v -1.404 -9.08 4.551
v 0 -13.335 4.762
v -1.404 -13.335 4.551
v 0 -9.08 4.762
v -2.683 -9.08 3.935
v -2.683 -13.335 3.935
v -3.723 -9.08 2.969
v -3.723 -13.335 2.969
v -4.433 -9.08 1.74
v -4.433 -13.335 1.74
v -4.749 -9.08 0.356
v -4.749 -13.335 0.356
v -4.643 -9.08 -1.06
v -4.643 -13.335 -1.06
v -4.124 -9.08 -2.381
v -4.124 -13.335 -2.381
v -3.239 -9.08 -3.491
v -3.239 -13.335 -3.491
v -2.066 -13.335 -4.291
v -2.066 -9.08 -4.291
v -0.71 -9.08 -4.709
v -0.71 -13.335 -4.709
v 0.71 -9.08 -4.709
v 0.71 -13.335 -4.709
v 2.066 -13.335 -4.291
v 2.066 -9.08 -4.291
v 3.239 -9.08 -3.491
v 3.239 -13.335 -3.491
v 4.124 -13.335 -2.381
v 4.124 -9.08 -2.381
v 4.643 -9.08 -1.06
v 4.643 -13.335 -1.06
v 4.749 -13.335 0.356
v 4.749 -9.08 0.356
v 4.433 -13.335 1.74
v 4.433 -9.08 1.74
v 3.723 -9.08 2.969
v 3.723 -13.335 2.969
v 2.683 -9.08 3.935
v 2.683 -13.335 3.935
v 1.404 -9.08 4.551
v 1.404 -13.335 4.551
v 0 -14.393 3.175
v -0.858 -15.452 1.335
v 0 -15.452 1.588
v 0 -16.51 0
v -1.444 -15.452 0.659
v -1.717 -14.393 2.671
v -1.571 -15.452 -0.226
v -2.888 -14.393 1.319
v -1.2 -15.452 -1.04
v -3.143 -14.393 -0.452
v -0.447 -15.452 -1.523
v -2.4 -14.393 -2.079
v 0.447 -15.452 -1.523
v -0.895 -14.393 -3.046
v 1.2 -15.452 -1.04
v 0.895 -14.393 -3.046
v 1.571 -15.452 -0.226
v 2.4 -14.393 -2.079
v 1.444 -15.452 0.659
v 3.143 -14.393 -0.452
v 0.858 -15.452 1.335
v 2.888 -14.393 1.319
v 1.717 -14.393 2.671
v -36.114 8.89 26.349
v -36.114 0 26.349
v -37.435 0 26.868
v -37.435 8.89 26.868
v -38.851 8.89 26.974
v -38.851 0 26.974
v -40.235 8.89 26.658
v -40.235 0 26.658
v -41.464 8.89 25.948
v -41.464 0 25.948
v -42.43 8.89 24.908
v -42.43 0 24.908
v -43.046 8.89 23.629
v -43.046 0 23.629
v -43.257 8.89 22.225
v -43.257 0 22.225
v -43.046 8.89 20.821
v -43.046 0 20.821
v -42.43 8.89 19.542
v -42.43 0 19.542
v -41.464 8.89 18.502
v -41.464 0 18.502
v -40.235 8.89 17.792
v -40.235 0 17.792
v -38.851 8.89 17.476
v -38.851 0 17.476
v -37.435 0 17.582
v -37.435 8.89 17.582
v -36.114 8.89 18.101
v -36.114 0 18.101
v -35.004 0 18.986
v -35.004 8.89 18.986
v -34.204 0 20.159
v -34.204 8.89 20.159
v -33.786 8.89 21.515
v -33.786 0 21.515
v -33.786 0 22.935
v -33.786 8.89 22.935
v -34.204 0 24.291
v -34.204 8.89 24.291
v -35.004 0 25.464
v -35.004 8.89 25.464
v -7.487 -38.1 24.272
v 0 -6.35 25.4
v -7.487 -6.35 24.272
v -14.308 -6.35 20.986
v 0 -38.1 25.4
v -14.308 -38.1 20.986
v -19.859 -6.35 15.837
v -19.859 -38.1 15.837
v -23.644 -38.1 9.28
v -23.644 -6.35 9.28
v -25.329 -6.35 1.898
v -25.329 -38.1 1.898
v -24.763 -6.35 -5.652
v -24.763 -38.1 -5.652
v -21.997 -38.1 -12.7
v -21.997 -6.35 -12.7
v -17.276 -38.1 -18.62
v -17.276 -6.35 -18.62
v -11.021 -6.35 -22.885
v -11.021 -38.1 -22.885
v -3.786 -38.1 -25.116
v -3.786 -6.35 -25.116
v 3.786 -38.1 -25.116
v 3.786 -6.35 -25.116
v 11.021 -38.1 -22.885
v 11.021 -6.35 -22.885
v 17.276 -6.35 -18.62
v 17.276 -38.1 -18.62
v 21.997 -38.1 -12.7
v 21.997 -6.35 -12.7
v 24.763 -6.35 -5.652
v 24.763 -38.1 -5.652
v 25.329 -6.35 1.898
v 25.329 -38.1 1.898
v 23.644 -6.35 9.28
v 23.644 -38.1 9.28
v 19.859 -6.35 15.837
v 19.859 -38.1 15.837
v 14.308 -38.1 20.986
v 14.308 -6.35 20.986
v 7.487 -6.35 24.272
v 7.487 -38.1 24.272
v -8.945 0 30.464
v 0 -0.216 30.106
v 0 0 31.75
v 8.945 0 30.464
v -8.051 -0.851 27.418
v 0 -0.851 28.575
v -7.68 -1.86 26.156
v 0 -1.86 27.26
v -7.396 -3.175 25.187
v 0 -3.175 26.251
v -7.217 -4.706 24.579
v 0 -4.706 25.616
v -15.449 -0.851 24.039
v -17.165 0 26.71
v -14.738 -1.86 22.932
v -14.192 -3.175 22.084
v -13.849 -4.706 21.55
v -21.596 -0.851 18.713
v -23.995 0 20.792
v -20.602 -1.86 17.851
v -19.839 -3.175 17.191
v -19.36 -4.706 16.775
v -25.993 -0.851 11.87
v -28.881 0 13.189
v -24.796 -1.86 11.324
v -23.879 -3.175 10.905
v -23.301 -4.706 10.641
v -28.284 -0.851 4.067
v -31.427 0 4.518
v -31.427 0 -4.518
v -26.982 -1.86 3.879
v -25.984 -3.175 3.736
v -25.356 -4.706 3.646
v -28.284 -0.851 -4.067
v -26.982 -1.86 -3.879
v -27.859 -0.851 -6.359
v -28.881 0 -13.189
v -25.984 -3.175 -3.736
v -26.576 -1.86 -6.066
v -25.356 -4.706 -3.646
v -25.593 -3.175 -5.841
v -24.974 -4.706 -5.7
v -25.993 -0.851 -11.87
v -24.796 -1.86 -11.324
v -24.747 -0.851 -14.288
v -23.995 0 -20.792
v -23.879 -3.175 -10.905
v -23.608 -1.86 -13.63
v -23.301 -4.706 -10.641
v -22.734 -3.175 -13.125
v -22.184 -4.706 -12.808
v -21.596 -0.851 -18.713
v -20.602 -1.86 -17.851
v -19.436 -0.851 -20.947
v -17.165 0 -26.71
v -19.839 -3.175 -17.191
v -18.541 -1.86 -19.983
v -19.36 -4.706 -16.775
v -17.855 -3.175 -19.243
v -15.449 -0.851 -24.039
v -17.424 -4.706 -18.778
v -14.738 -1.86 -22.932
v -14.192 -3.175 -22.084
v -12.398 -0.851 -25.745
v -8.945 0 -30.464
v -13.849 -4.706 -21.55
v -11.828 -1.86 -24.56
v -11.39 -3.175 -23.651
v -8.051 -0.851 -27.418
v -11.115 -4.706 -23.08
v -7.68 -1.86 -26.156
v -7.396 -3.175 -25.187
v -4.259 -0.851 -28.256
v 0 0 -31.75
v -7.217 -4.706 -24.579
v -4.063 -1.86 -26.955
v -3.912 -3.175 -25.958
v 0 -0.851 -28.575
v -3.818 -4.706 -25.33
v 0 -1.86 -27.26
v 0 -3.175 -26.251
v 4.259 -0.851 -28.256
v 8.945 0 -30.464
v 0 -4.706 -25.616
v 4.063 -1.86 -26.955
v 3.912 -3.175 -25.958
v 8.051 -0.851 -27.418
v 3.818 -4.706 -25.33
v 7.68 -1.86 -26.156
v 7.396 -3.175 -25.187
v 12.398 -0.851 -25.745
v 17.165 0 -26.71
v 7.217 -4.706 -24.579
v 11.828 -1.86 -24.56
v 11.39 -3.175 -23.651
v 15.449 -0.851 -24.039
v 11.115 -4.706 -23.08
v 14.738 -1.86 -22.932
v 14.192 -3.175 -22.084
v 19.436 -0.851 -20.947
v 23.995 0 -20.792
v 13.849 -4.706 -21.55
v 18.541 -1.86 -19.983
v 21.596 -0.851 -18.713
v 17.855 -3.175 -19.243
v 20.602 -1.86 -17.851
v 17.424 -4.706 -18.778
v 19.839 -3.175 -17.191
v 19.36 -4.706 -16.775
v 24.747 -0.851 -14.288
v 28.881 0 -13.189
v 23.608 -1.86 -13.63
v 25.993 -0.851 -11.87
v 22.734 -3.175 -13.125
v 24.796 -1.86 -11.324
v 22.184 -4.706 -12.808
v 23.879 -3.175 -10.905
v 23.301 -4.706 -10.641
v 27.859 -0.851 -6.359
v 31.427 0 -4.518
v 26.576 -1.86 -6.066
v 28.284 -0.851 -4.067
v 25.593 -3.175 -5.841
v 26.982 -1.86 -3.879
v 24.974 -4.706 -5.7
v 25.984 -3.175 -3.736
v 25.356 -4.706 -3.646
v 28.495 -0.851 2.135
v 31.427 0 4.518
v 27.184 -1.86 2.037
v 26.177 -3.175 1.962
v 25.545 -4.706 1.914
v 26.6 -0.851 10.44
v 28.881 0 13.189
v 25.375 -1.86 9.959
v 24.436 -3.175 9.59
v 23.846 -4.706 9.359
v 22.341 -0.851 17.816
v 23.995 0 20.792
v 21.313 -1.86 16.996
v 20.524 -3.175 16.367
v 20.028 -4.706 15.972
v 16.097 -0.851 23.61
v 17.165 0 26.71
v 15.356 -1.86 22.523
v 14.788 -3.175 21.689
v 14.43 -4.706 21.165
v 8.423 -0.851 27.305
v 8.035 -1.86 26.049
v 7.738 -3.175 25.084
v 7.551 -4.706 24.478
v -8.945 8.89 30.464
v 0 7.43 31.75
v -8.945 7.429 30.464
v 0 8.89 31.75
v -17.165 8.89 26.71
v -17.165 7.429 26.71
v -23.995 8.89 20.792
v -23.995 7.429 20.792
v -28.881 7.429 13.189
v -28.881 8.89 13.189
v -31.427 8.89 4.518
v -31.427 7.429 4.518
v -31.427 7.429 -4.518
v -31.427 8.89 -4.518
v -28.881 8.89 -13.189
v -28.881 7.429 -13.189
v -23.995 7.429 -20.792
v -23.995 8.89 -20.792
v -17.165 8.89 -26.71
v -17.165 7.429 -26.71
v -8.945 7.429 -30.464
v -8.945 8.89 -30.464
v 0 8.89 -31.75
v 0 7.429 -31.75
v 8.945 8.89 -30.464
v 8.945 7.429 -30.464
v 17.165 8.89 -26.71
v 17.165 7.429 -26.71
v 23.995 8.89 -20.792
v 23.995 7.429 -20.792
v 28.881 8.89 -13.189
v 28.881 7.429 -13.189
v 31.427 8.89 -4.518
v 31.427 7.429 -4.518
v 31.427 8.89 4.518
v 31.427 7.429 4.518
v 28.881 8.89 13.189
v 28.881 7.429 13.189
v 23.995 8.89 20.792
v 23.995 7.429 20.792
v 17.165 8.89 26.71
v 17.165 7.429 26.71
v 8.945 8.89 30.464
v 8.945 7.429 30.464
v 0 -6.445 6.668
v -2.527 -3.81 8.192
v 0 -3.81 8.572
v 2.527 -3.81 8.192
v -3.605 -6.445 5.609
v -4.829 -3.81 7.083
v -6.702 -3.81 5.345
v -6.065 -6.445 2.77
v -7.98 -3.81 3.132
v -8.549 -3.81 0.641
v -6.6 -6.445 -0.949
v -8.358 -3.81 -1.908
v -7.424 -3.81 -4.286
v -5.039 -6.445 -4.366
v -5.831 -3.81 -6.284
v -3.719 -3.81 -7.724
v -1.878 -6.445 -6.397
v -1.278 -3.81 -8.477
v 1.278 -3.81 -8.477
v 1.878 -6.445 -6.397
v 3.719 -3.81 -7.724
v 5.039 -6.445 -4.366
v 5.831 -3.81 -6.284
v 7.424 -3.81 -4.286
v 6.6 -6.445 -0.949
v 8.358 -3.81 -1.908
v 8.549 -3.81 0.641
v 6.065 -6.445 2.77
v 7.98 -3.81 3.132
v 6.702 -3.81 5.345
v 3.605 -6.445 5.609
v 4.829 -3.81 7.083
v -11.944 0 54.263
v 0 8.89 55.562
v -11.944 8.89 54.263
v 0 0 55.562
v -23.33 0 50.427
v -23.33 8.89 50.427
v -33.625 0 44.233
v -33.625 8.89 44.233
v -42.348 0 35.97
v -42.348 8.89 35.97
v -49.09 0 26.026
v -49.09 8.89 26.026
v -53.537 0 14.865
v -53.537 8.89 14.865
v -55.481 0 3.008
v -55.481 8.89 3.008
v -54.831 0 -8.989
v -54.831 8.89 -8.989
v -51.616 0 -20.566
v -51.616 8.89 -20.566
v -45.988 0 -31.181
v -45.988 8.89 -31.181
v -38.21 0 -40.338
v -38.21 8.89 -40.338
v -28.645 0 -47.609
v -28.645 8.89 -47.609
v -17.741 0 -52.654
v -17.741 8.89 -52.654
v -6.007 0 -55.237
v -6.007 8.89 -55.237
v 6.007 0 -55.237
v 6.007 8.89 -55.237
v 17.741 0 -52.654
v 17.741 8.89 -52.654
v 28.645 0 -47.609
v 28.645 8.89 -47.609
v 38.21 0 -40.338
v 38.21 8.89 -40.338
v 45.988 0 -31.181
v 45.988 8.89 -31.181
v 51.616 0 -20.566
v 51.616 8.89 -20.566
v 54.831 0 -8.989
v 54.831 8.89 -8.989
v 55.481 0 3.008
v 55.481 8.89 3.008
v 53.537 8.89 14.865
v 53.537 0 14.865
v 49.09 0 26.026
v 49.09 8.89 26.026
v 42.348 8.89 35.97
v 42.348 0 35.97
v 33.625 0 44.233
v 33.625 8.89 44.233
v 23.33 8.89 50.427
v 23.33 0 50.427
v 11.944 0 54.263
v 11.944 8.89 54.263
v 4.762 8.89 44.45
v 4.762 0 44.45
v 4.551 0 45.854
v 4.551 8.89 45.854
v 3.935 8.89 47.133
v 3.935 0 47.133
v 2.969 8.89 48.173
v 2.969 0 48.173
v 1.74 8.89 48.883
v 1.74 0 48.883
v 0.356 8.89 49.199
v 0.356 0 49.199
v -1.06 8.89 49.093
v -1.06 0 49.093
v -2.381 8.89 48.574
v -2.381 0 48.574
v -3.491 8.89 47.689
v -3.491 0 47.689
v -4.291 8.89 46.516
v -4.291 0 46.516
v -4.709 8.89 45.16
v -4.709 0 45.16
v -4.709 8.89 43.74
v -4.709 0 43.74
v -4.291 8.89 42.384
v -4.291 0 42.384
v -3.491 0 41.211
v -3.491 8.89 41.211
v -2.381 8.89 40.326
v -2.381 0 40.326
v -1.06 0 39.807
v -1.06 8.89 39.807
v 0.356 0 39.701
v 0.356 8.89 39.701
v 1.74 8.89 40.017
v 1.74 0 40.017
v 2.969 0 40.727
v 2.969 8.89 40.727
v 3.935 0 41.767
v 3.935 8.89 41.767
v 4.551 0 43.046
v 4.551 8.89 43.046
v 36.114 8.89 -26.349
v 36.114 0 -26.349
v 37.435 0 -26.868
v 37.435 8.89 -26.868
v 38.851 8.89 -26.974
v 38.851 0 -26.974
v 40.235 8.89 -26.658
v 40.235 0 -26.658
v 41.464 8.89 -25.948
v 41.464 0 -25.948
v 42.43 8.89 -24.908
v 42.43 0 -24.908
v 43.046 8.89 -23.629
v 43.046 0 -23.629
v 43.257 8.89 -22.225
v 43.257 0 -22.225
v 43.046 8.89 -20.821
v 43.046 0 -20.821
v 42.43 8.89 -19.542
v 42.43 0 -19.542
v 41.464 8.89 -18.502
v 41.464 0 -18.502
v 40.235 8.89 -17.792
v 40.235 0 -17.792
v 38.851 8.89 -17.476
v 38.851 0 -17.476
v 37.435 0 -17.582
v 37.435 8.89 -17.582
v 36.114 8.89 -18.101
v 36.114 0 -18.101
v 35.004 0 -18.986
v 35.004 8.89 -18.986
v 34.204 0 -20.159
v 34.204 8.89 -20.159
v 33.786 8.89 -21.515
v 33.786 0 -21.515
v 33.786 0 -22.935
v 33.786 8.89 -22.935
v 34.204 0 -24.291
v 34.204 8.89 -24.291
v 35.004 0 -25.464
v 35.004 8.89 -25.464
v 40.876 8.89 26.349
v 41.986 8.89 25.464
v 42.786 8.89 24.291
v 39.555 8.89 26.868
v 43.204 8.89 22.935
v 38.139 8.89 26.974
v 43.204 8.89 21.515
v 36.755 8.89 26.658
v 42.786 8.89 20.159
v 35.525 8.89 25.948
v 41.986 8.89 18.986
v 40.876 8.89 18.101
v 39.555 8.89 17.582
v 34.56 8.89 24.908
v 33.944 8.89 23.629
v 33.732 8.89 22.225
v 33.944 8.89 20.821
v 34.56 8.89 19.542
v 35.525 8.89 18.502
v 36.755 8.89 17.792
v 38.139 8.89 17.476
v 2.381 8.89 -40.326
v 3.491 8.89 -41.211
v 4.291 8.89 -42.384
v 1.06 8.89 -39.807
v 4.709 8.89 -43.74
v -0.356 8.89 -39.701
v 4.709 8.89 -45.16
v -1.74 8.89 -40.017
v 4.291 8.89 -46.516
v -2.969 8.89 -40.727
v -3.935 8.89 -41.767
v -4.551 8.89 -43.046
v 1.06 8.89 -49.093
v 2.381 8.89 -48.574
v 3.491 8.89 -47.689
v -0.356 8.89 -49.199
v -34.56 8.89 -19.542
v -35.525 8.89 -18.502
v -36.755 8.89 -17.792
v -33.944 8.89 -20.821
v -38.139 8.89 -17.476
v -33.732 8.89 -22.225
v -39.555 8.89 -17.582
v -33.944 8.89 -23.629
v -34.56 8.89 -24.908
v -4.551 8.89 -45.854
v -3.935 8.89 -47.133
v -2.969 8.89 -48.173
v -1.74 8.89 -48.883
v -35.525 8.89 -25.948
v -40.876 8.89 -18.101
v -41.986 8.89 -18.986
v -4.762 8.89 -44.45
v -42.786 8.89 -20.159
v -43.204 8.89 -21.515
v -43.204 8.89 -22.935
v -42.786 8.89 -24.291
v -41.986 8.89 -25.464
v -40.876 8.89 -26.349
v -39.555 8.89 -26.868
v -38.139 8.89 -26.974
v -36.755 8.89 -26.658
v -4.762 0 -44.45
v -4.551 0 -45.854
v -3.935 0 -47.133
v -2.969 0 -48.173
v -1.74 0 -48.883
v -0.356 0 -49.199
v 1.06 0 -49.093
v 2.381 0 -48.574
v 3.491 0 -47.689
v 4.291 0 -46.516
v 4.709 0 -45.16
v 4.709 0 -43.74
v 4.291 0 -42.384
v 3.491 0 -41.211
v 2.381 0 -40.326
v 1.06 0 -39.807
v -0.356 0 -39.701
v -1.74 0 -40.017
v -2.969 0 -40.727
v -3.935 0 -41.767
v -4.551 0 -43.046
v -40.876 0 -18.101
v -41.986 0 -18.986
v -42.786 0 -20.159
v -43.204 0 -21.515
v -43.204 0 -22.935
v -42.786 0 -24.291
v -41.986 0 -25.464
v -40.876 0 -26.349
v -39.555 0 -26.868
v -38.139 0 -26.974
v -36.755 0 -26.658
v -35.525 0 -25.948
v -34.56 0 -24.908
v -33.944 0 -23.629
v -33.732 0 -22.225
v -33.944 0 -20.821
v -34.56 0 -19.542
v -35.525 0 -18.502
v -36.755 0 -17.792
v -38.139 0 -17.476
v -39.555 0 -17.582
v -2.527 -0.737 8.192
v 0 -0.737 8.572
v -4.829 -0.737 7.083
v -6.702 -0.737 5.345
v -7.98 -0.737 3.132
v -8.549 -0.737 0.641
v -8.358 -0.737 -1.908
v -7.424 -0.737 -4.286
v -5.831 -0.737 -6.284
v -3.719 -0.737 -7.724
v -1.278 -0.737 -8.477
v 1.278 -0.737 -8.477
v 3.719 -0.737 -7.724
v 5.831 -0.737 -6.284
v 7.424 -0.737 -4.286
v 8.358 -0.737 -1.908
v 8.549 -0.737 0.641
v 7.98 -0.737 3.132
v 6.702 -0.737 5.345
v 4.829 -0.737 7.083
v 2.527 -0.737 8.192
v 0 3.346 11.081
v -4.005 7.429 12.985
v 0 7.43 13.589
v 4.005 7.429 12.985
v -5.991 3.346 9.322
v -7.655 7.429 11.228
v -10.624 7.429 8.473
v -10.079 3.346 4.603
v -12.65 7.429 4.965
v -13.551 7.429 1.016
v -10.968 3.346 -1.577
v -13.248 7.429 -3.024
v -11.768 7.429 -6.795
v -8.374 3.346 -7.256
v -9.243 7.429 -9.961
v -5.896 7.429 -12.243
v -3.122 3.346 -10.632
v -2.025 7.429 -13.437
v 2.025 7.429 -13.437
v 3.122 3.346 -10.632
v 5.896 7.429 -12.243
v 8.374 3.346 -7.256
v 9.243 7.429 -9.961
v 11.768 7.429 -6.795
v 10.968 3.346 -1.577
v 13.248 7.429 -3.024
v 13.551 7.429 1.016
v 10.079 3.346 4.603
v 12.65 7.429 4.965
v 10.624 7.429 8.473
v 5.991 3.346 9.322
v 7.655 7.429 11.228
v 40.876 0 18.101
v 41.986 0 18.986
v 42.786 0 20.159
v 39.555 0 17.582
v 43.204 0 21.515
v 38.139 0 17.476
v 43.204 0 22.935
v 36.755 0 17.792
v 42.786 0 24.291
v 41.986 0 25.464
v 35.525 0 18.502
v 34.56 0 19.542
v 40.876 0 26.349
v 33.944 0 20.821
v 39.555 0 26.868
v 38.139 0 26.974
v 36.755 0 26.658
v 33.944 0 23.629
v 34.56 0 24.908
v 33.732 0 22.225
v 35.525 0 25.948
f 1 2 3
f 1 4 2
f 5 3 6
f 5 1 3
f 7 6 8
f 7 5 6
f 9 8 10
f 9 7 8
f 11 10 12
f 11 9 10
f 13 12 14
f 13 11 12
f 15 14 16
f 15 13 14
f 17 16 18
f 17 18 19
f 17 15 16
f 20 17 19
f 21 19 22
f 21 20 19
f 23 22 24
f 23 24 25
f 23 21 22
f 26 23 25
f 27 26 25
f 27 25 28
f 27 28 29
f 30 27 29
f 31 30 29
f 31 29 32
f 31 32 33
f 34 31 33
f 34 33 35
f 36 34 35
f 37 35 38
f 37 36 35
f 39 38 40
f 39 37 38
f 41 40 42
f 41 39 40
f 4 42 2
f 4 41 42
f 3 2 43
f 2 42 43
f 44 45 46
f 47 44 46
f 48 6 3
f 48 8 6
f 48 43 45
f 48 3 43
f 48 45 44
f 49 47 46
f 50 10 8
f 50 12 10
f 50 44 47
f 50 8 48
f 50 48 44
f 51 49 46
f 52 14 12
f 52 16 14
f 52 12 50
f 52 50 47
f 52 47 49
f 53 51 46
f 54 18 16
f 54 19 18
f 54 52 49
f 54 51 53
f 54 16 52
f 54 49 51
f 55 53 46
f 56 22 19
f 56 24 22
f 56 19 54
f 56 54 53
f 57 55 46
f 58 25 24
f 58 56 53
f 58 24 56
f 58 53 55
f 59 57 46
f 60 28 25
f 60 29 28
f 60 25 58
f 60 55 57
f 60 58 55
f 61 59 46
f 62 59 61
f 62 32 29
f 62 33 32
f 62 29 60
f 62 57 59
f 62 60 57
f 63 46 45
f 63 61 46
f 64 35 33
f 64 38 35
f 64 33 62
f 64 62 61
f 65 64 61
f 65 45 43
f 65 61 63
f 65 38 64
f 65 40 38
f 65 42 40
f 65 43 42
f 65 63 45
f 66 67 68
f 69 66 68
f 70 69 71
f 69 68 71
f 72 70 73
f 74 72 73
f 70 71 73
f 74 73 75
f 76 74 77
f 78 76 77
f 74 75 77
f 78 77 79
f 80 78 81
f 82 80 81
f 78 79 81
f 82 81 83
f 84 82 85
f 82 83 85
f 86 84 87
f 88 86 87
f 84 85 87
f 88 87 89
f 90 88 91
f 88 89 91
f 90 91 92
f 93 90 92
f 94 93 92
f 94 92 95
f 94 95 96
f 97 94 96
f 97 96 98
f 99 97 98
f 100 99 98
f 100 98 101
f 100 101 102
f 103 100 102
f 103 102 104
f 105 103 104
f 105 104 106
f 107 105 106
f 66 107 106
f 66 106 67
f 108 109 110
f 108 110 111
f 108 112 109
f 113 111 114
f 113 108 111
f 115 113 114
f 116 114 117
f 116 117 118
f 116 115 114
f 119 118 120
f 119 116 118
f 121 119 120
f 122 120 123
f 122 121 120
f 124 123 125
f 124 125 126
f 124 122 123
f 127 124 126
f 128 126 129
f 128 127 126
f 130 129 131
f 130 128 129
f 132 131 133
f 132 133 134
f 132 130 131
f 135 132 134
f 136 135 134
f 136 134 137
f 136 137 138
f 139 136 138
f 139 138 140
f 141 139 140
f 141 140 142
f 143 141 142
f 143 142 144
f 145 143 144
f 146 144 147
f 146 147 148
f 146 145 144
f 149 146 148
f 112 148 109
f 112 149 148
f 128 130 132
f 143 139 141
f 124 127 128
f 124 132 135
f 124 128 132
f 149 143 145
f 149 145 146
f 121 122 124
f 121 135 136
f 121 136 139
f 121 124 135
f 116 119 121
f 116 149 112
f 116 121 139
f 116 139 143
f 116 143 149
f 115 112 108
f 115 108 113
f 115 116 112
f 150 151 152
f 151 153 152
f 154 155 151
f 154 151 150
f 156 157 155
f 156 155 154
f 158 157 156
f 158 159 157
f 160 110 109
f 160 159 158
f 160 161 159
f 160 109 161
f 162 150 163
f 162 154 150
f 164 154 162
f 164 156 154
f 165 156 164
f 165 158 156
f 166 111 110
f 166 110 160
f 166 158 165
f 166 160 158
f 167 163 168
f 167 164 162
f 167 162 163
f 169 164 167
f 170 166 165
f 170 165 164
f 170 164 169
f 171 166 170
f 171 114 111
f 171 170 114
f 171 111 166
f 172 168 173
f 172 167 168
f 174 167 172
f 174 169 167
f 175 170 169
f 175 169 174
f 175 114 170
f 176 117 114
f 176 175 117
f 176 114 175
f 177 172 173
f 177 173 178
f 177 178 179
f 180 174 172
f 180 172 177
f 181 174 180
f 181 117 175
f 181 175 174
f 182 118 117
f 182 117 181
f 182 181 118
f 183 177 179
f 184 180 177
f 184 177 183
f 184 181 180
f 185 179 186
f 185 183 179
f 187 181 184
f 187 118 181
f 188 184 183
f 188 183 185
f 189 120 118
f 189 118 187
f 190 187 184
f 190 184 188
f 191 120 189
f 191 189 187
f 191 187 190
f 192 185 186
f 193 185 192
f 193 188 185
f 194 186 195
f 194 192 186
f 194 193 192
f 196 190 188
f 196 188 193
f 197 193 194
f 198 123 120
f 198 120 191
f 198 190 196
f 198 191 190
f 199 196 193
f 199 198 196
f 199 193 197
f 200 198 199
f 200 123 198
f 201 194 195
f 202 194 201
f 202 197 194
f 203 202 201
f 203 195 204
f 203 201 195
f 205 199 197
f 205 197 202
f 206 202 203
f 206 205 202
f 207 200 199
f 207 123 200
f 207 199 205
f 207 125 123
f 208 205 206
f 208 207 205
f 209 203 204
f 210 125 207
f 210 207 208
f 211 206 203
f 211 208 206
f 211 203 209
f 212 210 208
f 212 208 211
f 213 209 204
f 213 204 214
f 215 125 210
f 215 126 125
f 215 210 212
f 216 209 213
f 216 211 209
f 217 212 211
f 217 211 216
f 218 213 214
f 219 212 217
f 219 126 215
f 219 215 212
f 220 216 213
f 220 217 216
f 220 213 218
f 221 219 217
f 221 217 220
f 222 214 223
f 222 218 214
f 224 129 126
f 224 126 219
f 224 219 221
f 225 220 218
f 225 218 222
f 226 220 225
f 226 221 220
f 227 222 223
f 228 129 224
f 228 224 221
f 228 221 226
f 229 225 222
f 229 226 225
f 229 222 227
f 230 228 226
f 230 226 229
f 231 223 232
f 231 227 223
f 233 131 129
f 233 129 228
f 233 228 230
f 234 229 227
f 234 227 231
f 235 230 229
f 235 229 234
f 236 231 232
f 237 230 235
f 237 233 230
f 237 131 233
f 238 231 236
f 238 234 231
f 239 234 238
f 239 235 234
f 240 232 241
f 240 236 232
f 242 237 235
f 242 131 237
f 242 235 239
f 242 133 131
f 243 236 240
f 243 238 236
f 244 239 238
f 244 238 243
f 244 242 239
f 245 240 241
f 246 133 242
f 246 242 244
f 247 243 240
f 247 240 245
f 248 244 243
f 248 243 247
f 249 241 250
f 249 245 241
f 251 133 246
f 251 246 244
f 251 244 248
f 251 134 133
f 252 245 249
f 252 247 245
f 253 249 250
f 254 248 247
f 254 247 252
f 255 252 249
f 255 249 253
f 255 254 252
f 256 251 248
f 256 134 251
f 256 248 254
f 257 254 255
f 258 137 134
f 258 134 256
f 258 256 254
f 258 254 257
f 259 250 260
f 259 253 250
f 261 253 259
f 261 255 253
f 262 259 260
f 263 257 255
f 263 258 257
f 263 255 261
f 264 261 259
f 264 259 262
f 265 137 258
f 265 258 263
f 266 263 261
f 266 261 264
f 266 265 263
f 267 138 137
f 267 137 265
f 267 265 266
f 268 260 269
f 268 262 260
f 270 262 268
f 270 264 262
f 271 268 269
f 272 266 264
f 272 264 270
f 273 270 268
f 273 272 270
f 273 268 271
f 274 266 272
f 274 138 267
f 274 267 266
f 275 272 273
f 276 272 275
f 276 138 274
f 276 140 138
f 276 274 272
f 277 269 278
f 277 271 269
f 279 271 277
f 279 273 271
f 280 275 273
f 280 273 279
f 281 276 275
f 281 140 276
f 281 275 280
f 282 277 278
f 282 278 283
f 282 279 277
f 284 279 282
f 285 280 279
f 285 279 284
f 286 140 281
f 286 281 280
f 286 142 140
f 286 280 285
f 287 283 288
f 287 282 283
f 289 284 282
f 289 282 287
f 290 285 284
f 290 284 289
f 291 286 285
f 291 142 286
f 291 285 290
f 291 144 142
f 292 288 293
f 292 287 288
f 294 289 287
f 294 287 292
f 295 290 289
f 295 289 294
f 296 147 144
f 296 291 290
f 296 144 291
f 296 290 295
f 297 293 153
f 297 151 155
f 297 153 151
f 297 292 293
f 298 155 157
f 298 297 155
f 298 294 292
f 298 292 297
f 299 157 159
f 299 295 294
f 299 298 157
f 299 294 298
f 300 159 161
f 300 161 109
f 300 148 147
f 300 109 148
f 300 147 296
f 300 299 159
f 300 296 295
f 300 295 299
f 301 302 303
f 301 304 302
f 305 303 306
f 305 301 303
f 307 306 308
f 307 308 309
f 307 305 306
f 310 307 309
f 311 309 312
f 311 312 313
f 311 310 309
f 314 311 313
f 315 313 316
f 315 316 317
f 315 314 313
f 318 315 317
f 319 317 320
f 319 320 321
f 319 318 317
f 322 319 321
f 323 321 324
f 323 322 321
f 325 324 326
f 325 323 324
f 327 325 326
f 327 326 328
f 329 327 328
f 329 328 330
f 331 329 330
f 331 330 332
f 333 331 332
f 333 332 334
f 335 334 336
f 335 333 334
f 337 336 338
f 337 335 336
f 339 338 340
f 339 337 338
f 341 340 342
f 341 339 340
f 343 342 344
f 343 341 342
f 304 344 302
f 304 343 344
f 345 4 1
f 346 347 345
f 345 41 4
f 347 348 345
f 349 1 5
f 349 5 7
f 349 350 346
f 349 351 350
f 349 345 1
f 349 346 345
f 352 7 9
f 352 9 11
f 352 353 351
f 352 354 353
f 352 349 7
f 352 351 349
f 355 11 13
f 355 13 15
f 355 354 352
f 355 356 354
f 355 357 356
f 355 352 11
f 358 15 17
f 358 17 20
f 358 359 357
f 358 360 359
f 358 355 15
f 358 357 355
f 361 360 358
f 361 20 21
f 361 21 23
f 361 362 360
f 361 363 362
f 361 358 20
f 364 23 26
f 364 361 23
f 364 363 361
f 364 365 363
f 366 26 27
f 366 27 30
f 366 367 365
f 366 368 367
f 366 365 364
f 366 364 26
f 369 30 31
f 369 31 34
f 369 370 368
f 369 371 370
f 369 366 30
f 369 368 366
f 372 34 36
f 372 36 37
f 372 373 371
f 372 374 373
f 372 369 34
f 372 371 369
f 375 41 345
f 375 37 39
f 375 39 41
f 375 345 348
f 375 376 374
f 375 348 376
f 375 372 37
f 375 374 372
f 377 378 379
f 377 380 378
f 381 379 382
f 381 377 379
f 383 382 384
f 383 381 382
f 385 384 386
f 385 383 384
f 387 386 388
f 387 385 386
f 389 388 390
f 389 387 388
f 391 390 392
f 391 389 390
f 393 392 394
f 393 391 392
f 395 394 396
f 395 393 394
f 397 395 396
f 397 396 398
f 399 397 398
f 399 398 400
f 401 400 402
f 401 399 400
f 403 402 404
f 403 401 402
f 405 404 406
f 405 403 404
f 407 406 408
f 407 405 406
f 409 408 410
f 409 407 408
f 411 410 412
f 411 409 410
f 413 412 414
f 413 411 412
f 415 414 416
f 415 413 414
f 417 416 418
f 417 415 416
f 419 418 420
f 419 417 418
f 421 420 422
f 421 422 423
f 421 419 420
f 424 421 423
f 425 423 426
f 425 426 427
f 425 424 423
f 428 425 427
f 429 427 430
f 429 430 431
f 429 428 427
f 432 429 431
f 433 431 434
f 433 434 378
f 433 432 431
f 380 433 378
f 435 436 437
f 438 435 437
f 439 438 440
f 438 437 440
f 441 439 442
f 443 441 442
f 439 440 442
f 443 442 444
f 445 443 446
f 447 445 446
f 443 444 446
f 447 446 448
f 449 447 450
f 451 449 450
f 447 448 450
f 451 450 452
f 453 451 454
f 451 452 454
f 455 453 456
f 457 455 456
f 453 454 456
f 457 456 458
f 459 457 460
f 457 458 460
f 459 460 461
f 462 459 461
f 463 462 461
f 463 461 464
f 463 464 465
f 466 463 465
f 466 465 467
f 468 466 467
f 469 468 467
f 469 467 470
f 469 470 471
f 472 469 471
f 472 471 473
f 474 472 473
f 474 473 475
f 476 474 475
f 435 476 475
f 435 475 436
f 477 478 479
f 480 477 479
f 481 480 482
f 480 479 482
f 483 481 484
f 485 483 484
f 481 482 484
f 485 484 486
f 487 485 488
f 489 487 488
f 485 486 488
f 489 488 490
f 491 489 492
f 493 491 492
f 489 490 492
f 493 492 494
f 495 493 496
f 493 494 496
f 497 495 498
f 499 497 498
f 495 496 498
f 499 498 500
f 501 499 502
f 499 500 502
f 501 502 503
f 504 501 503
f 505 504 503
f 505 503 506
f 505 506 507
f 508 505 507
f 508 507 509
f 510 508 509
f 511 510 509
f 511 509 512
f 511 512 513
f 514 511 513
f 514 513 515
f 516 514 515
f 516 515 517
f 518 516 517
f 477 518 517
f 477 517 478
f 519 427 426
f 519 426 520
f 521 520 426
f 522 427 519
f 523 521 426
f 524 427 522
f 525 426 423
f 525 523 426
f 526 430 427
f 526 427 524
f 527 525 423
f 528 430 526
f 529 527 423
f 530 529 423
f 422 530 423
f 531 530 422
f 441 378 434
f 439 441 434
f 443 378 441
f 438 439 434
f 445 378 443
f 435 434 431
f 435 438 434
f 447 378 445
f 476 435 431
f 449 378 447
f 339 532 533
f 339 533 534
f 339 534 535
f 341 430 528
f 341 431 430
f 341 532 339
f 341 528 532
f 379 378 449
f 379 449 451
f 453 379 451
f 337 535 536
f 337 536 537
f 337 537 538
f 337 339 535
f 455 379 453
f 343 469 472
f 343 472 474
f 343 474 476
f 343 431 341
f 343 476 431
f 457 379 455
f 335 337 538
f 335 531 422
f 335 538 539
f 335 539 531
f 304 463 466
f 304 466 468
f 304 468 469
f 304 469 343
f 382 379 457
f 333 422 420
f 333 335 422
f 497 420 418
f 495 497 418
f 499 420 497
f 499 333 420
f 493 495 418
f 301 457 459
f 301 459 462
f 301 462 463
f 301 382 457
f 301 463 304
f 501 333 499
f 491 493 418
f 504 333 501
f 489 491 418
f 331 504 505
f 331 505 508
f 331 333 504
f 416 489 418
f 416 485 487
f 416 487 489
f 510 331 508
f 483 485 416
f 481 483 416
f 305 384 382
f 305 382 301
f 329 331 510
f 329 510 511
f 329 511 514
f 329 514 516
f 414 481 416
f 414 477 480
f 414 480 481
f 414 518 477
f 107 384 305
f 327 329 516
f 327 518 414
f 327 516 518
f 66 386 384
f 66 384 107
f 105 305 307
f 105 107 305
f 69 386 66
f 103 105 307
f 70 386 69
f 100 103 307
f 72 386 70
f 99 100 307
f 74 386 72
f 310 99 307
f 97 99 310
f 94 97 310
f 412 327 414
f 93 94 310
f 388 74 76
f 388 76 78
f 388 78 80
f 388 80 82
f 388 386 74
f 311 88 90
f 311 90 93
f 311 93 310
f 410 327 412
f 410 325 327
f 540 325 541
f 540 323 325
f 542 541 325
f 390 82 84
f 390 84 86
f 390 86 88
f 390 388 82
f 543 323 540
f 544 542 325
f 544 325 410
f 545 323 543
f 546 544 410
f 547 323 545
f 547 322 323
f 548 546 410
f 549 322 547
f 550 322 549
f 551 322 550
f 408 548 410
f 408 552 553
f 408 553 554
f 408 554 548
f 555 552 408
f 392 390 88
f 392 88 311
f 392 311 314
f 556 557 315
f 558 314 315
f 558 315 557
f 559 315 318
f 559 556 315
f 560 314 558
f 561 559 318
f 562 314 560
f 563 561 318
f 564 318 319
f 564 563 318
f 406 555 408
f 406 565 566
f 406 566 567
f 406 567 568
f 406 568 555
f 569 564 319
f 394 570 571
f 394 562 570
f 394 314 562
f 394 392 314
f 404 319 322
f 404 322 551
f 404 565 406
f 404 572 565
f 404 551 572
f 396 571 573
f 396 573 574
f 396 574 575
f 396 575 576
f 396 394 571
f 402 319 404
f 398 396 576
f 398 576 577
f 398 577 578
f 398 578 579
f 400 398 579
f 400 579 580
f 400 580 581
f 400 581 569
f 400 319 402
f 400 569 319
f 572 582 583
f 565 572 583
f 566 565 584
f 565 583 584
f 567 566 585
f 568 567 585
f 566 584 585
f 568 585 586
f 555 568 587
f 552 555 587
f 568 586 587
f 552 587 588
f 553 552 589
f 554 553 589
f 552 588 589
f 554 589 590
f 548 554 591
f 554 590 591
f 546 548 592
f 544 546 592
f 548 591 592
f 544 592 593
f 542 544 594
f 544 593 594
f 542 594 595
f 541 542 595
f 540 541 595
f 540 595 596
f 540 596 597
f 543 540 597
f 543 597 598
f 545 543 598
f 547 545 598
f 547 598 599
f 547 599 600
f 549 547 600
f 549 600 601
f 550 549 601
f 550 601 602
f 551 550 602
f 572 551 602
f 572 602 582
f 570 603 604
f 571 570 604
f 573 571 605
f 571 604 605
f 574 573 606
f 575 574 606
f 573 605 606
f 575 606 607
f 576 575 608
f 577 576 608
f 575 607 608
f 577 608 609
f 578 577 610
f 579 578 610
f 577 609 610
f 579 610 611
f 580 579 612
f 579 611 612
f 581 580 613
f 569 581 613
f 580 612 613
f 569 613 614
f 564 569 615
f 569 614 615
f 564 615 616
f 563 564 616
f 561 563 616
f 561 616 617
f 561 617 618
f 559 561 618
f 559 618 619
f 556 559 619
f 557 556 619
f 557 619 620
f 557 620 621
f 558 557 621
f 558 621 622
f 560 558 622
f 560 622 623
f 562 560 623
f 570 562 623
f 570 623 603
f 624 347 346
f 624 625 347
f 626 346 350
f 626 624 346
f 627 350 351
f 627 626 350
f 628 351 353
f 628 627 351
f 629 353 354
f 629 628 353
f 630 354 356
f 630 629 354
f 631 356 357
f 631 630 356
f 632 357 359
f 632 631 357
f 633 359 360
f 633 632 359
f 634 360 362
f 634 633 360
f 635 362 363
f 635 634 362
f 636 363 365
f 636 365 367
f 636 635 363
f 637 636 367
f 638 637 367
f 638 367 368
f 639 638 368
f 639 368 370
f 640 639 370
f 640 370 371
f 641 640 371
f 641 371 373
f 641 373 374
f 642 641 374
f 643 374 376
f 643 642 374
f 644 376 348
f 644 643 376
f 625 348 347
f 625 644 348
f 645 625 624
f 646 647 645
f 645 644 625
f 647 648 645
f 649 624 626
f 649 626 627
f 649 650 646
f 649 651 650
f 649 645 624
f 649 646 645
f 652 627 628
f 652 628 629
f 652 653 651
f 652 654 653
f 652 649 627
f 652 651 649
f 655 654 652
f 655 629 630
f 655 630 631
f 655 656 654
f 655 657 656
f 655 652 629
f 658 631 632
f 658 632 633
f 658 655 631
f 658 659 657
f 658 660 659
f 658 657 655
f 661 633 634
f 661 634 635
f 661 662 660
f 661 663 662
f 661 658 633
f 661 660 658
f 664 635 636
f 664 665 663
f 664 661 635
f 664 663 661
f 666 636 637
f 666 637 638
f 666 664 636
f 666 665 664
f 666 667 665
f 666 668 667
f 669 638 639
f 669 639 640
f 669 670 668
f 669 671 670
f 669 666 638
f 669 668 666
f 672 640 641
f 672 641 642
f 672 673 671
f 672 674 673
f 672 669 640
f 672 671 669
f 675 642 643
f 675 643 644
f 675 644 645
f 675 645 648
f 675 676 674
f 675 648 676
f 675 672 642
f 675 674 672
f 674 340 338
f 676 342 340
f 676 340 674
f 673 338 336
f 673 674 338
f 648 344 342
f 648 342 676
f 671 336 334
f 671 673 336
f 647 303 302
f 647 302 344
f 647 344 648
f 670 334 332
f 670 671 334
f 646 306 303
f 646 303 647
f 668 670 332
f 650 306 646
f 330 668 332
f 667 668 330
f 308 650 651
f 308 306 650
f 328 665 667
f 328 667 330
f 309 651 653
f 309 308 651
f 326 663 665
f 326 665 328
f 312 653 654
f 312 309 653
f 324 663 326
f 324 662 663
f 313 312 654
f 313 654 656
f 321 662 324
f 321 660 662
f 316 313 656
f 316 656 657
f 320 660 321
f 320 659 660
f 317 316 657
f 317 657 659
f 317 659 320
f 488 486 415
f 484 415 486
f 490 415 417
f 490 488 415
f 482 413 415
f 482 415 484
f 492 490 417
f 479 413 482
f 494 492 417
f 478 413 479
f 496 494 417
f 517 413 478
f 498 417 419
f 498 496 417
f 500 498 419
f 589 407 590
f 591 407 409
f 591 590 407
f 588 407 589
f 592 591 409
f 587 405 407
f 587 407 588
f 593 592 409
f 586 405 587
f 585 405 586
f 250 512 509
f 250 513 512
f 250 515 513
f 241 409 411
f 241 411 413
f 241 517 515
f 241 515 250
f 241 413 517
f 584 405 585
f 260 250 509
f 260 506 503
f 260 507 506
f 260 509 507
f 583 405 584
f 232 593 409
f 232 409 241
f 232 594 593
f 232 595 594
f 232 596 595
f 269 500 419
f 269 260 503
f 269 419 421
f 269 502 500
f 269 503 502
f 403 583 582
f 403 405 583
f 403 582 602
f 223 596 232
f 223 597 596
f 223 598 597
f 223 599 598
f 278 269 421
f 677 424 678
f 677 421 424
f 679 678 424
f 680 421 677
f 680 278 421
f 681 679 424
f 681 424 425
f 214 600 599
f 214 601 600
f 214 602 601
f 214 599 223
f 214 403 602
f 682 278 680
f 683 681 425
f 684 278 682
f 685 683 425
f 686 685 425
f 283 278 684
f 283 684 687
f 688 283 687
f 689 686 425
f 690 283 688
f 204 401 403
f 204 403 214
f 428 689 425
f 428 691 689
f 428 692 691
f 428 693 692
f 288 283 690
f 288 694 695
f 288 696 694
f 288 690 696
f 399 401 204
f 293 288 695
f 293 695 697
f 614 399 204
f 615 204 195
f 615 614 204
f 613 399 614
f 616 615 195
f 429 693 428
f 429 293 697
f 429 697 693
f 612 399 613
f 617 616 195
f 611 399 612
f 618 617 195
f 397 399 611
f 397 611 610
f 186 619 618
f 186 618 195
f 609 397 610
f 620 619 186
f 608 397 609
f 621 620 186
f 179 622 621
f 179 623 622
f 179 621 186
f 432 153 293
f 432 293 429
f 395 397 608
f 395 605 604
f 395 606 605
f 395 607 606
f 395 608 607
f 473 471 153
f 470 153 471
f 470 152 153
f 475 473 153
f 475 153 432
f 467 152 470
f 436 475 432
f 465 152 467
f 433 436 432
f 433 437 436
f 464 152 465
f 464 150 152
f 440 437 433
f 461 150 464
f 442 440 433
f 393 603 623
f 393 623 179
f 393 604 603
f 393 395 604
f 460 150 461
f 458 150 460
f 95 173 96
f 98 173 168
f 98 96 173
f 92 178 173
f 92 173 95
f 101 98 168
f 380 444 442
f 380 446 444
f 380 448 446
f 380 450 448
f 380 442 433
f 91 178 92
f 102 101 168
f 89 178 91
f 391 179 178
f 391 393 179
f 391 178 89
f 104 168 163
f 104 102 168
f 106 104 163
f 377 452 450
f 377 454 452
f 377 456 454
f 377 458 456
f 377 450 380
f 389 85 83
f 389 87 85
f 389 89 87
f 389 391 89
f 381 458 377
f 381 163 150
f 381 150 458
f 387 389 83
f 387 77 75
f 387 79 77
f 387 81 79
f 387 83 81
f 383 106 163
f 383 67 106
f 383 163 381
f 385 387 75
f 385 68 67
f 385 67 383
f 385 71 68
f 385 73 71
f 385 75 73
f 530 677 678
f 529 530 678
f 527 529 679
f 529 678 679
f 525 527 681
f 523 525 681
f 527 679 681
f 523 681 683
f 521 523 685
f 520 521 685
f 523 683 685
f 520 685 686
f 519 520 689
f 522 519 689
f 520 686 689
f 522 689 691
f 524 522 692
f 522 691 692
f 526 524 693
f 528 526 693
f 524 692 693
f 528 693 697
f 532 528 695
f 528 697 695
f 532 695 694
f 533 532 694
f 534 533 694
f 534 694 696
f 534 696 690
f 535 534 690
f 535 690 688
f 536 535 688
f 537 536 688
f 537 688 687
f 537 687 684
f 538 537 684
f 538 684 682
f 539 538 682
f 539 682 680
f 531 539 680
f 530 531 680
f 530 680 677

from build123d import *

# Parameters (mm, degrees)
F3_D            = 9.525
F3_COPIES_COUNT = 6


# Not quite as in the source:
# - a pattern or mirror of a feature is missing from the dataset's text; its kind, count and spacing are read off the source's solid


with BuildPart() as f1:
    # F0 (on Right) → F1 (revolve)
    with BuildSketch(Plane.YZ):
        with BuildLine():
            Line((8.89, 55.5625), (0, 55.5625))
            Line((0, 55.5625), (0, 31.75))
            ThreePointArc((0, 31.75), (-1.8598719395, 27.2598719395), (-6.35, 25.4))
            Line((-6.35, 25.4), (-38.1, 25.4))
            Line((-38.1, 25.4), (-38.1, 0))
            Line((-38.1, 0), (-16.51, 0))
            Line((-16.51, 0), (-13.335, 4.7625))
            Line((-13.335, 4.7625), (-9.0805, 4.7625))
            Line((-9.0805, 4.7625), (-3.81, 8.5725))
            Line((-3.81, 8.5725), (-0.7366, 8.5725))
            Line((-0.7366, 8.5725), (7.4295, 13.589))
            Line((7.4295, 13.589), (7.4295, 31.75))
            Line((7.4295, 31.75), (8.89, 31.75))
            Line((8.89, 31.75), (8.89, 55.5625))
        make_face()
    revolve(axis=Axis((0, -27.305, 0), (0, -1, 0)))

    # F3 (through all)
    with Locations(Plane(origin=(0, 8.89, 0), x_dir=(-1, 0, 0), z_dir=(0, 1, 0))):
        with Locations((0, 44.45)):
            f3 = Hole(F3_D / 2)

    # F3_copies: F3 ×6 about axis
    f3_copies_axis = Axis((0, 0, 0), (0, 1, 0))
    for i in range(1, F3_COPIES_COUNT):
        add(f3.rotate(f3_copies_axis, i * 360 / F3_COPIES_COUNT), mode=Mode.SUBTRACT)


solid = f1.part
